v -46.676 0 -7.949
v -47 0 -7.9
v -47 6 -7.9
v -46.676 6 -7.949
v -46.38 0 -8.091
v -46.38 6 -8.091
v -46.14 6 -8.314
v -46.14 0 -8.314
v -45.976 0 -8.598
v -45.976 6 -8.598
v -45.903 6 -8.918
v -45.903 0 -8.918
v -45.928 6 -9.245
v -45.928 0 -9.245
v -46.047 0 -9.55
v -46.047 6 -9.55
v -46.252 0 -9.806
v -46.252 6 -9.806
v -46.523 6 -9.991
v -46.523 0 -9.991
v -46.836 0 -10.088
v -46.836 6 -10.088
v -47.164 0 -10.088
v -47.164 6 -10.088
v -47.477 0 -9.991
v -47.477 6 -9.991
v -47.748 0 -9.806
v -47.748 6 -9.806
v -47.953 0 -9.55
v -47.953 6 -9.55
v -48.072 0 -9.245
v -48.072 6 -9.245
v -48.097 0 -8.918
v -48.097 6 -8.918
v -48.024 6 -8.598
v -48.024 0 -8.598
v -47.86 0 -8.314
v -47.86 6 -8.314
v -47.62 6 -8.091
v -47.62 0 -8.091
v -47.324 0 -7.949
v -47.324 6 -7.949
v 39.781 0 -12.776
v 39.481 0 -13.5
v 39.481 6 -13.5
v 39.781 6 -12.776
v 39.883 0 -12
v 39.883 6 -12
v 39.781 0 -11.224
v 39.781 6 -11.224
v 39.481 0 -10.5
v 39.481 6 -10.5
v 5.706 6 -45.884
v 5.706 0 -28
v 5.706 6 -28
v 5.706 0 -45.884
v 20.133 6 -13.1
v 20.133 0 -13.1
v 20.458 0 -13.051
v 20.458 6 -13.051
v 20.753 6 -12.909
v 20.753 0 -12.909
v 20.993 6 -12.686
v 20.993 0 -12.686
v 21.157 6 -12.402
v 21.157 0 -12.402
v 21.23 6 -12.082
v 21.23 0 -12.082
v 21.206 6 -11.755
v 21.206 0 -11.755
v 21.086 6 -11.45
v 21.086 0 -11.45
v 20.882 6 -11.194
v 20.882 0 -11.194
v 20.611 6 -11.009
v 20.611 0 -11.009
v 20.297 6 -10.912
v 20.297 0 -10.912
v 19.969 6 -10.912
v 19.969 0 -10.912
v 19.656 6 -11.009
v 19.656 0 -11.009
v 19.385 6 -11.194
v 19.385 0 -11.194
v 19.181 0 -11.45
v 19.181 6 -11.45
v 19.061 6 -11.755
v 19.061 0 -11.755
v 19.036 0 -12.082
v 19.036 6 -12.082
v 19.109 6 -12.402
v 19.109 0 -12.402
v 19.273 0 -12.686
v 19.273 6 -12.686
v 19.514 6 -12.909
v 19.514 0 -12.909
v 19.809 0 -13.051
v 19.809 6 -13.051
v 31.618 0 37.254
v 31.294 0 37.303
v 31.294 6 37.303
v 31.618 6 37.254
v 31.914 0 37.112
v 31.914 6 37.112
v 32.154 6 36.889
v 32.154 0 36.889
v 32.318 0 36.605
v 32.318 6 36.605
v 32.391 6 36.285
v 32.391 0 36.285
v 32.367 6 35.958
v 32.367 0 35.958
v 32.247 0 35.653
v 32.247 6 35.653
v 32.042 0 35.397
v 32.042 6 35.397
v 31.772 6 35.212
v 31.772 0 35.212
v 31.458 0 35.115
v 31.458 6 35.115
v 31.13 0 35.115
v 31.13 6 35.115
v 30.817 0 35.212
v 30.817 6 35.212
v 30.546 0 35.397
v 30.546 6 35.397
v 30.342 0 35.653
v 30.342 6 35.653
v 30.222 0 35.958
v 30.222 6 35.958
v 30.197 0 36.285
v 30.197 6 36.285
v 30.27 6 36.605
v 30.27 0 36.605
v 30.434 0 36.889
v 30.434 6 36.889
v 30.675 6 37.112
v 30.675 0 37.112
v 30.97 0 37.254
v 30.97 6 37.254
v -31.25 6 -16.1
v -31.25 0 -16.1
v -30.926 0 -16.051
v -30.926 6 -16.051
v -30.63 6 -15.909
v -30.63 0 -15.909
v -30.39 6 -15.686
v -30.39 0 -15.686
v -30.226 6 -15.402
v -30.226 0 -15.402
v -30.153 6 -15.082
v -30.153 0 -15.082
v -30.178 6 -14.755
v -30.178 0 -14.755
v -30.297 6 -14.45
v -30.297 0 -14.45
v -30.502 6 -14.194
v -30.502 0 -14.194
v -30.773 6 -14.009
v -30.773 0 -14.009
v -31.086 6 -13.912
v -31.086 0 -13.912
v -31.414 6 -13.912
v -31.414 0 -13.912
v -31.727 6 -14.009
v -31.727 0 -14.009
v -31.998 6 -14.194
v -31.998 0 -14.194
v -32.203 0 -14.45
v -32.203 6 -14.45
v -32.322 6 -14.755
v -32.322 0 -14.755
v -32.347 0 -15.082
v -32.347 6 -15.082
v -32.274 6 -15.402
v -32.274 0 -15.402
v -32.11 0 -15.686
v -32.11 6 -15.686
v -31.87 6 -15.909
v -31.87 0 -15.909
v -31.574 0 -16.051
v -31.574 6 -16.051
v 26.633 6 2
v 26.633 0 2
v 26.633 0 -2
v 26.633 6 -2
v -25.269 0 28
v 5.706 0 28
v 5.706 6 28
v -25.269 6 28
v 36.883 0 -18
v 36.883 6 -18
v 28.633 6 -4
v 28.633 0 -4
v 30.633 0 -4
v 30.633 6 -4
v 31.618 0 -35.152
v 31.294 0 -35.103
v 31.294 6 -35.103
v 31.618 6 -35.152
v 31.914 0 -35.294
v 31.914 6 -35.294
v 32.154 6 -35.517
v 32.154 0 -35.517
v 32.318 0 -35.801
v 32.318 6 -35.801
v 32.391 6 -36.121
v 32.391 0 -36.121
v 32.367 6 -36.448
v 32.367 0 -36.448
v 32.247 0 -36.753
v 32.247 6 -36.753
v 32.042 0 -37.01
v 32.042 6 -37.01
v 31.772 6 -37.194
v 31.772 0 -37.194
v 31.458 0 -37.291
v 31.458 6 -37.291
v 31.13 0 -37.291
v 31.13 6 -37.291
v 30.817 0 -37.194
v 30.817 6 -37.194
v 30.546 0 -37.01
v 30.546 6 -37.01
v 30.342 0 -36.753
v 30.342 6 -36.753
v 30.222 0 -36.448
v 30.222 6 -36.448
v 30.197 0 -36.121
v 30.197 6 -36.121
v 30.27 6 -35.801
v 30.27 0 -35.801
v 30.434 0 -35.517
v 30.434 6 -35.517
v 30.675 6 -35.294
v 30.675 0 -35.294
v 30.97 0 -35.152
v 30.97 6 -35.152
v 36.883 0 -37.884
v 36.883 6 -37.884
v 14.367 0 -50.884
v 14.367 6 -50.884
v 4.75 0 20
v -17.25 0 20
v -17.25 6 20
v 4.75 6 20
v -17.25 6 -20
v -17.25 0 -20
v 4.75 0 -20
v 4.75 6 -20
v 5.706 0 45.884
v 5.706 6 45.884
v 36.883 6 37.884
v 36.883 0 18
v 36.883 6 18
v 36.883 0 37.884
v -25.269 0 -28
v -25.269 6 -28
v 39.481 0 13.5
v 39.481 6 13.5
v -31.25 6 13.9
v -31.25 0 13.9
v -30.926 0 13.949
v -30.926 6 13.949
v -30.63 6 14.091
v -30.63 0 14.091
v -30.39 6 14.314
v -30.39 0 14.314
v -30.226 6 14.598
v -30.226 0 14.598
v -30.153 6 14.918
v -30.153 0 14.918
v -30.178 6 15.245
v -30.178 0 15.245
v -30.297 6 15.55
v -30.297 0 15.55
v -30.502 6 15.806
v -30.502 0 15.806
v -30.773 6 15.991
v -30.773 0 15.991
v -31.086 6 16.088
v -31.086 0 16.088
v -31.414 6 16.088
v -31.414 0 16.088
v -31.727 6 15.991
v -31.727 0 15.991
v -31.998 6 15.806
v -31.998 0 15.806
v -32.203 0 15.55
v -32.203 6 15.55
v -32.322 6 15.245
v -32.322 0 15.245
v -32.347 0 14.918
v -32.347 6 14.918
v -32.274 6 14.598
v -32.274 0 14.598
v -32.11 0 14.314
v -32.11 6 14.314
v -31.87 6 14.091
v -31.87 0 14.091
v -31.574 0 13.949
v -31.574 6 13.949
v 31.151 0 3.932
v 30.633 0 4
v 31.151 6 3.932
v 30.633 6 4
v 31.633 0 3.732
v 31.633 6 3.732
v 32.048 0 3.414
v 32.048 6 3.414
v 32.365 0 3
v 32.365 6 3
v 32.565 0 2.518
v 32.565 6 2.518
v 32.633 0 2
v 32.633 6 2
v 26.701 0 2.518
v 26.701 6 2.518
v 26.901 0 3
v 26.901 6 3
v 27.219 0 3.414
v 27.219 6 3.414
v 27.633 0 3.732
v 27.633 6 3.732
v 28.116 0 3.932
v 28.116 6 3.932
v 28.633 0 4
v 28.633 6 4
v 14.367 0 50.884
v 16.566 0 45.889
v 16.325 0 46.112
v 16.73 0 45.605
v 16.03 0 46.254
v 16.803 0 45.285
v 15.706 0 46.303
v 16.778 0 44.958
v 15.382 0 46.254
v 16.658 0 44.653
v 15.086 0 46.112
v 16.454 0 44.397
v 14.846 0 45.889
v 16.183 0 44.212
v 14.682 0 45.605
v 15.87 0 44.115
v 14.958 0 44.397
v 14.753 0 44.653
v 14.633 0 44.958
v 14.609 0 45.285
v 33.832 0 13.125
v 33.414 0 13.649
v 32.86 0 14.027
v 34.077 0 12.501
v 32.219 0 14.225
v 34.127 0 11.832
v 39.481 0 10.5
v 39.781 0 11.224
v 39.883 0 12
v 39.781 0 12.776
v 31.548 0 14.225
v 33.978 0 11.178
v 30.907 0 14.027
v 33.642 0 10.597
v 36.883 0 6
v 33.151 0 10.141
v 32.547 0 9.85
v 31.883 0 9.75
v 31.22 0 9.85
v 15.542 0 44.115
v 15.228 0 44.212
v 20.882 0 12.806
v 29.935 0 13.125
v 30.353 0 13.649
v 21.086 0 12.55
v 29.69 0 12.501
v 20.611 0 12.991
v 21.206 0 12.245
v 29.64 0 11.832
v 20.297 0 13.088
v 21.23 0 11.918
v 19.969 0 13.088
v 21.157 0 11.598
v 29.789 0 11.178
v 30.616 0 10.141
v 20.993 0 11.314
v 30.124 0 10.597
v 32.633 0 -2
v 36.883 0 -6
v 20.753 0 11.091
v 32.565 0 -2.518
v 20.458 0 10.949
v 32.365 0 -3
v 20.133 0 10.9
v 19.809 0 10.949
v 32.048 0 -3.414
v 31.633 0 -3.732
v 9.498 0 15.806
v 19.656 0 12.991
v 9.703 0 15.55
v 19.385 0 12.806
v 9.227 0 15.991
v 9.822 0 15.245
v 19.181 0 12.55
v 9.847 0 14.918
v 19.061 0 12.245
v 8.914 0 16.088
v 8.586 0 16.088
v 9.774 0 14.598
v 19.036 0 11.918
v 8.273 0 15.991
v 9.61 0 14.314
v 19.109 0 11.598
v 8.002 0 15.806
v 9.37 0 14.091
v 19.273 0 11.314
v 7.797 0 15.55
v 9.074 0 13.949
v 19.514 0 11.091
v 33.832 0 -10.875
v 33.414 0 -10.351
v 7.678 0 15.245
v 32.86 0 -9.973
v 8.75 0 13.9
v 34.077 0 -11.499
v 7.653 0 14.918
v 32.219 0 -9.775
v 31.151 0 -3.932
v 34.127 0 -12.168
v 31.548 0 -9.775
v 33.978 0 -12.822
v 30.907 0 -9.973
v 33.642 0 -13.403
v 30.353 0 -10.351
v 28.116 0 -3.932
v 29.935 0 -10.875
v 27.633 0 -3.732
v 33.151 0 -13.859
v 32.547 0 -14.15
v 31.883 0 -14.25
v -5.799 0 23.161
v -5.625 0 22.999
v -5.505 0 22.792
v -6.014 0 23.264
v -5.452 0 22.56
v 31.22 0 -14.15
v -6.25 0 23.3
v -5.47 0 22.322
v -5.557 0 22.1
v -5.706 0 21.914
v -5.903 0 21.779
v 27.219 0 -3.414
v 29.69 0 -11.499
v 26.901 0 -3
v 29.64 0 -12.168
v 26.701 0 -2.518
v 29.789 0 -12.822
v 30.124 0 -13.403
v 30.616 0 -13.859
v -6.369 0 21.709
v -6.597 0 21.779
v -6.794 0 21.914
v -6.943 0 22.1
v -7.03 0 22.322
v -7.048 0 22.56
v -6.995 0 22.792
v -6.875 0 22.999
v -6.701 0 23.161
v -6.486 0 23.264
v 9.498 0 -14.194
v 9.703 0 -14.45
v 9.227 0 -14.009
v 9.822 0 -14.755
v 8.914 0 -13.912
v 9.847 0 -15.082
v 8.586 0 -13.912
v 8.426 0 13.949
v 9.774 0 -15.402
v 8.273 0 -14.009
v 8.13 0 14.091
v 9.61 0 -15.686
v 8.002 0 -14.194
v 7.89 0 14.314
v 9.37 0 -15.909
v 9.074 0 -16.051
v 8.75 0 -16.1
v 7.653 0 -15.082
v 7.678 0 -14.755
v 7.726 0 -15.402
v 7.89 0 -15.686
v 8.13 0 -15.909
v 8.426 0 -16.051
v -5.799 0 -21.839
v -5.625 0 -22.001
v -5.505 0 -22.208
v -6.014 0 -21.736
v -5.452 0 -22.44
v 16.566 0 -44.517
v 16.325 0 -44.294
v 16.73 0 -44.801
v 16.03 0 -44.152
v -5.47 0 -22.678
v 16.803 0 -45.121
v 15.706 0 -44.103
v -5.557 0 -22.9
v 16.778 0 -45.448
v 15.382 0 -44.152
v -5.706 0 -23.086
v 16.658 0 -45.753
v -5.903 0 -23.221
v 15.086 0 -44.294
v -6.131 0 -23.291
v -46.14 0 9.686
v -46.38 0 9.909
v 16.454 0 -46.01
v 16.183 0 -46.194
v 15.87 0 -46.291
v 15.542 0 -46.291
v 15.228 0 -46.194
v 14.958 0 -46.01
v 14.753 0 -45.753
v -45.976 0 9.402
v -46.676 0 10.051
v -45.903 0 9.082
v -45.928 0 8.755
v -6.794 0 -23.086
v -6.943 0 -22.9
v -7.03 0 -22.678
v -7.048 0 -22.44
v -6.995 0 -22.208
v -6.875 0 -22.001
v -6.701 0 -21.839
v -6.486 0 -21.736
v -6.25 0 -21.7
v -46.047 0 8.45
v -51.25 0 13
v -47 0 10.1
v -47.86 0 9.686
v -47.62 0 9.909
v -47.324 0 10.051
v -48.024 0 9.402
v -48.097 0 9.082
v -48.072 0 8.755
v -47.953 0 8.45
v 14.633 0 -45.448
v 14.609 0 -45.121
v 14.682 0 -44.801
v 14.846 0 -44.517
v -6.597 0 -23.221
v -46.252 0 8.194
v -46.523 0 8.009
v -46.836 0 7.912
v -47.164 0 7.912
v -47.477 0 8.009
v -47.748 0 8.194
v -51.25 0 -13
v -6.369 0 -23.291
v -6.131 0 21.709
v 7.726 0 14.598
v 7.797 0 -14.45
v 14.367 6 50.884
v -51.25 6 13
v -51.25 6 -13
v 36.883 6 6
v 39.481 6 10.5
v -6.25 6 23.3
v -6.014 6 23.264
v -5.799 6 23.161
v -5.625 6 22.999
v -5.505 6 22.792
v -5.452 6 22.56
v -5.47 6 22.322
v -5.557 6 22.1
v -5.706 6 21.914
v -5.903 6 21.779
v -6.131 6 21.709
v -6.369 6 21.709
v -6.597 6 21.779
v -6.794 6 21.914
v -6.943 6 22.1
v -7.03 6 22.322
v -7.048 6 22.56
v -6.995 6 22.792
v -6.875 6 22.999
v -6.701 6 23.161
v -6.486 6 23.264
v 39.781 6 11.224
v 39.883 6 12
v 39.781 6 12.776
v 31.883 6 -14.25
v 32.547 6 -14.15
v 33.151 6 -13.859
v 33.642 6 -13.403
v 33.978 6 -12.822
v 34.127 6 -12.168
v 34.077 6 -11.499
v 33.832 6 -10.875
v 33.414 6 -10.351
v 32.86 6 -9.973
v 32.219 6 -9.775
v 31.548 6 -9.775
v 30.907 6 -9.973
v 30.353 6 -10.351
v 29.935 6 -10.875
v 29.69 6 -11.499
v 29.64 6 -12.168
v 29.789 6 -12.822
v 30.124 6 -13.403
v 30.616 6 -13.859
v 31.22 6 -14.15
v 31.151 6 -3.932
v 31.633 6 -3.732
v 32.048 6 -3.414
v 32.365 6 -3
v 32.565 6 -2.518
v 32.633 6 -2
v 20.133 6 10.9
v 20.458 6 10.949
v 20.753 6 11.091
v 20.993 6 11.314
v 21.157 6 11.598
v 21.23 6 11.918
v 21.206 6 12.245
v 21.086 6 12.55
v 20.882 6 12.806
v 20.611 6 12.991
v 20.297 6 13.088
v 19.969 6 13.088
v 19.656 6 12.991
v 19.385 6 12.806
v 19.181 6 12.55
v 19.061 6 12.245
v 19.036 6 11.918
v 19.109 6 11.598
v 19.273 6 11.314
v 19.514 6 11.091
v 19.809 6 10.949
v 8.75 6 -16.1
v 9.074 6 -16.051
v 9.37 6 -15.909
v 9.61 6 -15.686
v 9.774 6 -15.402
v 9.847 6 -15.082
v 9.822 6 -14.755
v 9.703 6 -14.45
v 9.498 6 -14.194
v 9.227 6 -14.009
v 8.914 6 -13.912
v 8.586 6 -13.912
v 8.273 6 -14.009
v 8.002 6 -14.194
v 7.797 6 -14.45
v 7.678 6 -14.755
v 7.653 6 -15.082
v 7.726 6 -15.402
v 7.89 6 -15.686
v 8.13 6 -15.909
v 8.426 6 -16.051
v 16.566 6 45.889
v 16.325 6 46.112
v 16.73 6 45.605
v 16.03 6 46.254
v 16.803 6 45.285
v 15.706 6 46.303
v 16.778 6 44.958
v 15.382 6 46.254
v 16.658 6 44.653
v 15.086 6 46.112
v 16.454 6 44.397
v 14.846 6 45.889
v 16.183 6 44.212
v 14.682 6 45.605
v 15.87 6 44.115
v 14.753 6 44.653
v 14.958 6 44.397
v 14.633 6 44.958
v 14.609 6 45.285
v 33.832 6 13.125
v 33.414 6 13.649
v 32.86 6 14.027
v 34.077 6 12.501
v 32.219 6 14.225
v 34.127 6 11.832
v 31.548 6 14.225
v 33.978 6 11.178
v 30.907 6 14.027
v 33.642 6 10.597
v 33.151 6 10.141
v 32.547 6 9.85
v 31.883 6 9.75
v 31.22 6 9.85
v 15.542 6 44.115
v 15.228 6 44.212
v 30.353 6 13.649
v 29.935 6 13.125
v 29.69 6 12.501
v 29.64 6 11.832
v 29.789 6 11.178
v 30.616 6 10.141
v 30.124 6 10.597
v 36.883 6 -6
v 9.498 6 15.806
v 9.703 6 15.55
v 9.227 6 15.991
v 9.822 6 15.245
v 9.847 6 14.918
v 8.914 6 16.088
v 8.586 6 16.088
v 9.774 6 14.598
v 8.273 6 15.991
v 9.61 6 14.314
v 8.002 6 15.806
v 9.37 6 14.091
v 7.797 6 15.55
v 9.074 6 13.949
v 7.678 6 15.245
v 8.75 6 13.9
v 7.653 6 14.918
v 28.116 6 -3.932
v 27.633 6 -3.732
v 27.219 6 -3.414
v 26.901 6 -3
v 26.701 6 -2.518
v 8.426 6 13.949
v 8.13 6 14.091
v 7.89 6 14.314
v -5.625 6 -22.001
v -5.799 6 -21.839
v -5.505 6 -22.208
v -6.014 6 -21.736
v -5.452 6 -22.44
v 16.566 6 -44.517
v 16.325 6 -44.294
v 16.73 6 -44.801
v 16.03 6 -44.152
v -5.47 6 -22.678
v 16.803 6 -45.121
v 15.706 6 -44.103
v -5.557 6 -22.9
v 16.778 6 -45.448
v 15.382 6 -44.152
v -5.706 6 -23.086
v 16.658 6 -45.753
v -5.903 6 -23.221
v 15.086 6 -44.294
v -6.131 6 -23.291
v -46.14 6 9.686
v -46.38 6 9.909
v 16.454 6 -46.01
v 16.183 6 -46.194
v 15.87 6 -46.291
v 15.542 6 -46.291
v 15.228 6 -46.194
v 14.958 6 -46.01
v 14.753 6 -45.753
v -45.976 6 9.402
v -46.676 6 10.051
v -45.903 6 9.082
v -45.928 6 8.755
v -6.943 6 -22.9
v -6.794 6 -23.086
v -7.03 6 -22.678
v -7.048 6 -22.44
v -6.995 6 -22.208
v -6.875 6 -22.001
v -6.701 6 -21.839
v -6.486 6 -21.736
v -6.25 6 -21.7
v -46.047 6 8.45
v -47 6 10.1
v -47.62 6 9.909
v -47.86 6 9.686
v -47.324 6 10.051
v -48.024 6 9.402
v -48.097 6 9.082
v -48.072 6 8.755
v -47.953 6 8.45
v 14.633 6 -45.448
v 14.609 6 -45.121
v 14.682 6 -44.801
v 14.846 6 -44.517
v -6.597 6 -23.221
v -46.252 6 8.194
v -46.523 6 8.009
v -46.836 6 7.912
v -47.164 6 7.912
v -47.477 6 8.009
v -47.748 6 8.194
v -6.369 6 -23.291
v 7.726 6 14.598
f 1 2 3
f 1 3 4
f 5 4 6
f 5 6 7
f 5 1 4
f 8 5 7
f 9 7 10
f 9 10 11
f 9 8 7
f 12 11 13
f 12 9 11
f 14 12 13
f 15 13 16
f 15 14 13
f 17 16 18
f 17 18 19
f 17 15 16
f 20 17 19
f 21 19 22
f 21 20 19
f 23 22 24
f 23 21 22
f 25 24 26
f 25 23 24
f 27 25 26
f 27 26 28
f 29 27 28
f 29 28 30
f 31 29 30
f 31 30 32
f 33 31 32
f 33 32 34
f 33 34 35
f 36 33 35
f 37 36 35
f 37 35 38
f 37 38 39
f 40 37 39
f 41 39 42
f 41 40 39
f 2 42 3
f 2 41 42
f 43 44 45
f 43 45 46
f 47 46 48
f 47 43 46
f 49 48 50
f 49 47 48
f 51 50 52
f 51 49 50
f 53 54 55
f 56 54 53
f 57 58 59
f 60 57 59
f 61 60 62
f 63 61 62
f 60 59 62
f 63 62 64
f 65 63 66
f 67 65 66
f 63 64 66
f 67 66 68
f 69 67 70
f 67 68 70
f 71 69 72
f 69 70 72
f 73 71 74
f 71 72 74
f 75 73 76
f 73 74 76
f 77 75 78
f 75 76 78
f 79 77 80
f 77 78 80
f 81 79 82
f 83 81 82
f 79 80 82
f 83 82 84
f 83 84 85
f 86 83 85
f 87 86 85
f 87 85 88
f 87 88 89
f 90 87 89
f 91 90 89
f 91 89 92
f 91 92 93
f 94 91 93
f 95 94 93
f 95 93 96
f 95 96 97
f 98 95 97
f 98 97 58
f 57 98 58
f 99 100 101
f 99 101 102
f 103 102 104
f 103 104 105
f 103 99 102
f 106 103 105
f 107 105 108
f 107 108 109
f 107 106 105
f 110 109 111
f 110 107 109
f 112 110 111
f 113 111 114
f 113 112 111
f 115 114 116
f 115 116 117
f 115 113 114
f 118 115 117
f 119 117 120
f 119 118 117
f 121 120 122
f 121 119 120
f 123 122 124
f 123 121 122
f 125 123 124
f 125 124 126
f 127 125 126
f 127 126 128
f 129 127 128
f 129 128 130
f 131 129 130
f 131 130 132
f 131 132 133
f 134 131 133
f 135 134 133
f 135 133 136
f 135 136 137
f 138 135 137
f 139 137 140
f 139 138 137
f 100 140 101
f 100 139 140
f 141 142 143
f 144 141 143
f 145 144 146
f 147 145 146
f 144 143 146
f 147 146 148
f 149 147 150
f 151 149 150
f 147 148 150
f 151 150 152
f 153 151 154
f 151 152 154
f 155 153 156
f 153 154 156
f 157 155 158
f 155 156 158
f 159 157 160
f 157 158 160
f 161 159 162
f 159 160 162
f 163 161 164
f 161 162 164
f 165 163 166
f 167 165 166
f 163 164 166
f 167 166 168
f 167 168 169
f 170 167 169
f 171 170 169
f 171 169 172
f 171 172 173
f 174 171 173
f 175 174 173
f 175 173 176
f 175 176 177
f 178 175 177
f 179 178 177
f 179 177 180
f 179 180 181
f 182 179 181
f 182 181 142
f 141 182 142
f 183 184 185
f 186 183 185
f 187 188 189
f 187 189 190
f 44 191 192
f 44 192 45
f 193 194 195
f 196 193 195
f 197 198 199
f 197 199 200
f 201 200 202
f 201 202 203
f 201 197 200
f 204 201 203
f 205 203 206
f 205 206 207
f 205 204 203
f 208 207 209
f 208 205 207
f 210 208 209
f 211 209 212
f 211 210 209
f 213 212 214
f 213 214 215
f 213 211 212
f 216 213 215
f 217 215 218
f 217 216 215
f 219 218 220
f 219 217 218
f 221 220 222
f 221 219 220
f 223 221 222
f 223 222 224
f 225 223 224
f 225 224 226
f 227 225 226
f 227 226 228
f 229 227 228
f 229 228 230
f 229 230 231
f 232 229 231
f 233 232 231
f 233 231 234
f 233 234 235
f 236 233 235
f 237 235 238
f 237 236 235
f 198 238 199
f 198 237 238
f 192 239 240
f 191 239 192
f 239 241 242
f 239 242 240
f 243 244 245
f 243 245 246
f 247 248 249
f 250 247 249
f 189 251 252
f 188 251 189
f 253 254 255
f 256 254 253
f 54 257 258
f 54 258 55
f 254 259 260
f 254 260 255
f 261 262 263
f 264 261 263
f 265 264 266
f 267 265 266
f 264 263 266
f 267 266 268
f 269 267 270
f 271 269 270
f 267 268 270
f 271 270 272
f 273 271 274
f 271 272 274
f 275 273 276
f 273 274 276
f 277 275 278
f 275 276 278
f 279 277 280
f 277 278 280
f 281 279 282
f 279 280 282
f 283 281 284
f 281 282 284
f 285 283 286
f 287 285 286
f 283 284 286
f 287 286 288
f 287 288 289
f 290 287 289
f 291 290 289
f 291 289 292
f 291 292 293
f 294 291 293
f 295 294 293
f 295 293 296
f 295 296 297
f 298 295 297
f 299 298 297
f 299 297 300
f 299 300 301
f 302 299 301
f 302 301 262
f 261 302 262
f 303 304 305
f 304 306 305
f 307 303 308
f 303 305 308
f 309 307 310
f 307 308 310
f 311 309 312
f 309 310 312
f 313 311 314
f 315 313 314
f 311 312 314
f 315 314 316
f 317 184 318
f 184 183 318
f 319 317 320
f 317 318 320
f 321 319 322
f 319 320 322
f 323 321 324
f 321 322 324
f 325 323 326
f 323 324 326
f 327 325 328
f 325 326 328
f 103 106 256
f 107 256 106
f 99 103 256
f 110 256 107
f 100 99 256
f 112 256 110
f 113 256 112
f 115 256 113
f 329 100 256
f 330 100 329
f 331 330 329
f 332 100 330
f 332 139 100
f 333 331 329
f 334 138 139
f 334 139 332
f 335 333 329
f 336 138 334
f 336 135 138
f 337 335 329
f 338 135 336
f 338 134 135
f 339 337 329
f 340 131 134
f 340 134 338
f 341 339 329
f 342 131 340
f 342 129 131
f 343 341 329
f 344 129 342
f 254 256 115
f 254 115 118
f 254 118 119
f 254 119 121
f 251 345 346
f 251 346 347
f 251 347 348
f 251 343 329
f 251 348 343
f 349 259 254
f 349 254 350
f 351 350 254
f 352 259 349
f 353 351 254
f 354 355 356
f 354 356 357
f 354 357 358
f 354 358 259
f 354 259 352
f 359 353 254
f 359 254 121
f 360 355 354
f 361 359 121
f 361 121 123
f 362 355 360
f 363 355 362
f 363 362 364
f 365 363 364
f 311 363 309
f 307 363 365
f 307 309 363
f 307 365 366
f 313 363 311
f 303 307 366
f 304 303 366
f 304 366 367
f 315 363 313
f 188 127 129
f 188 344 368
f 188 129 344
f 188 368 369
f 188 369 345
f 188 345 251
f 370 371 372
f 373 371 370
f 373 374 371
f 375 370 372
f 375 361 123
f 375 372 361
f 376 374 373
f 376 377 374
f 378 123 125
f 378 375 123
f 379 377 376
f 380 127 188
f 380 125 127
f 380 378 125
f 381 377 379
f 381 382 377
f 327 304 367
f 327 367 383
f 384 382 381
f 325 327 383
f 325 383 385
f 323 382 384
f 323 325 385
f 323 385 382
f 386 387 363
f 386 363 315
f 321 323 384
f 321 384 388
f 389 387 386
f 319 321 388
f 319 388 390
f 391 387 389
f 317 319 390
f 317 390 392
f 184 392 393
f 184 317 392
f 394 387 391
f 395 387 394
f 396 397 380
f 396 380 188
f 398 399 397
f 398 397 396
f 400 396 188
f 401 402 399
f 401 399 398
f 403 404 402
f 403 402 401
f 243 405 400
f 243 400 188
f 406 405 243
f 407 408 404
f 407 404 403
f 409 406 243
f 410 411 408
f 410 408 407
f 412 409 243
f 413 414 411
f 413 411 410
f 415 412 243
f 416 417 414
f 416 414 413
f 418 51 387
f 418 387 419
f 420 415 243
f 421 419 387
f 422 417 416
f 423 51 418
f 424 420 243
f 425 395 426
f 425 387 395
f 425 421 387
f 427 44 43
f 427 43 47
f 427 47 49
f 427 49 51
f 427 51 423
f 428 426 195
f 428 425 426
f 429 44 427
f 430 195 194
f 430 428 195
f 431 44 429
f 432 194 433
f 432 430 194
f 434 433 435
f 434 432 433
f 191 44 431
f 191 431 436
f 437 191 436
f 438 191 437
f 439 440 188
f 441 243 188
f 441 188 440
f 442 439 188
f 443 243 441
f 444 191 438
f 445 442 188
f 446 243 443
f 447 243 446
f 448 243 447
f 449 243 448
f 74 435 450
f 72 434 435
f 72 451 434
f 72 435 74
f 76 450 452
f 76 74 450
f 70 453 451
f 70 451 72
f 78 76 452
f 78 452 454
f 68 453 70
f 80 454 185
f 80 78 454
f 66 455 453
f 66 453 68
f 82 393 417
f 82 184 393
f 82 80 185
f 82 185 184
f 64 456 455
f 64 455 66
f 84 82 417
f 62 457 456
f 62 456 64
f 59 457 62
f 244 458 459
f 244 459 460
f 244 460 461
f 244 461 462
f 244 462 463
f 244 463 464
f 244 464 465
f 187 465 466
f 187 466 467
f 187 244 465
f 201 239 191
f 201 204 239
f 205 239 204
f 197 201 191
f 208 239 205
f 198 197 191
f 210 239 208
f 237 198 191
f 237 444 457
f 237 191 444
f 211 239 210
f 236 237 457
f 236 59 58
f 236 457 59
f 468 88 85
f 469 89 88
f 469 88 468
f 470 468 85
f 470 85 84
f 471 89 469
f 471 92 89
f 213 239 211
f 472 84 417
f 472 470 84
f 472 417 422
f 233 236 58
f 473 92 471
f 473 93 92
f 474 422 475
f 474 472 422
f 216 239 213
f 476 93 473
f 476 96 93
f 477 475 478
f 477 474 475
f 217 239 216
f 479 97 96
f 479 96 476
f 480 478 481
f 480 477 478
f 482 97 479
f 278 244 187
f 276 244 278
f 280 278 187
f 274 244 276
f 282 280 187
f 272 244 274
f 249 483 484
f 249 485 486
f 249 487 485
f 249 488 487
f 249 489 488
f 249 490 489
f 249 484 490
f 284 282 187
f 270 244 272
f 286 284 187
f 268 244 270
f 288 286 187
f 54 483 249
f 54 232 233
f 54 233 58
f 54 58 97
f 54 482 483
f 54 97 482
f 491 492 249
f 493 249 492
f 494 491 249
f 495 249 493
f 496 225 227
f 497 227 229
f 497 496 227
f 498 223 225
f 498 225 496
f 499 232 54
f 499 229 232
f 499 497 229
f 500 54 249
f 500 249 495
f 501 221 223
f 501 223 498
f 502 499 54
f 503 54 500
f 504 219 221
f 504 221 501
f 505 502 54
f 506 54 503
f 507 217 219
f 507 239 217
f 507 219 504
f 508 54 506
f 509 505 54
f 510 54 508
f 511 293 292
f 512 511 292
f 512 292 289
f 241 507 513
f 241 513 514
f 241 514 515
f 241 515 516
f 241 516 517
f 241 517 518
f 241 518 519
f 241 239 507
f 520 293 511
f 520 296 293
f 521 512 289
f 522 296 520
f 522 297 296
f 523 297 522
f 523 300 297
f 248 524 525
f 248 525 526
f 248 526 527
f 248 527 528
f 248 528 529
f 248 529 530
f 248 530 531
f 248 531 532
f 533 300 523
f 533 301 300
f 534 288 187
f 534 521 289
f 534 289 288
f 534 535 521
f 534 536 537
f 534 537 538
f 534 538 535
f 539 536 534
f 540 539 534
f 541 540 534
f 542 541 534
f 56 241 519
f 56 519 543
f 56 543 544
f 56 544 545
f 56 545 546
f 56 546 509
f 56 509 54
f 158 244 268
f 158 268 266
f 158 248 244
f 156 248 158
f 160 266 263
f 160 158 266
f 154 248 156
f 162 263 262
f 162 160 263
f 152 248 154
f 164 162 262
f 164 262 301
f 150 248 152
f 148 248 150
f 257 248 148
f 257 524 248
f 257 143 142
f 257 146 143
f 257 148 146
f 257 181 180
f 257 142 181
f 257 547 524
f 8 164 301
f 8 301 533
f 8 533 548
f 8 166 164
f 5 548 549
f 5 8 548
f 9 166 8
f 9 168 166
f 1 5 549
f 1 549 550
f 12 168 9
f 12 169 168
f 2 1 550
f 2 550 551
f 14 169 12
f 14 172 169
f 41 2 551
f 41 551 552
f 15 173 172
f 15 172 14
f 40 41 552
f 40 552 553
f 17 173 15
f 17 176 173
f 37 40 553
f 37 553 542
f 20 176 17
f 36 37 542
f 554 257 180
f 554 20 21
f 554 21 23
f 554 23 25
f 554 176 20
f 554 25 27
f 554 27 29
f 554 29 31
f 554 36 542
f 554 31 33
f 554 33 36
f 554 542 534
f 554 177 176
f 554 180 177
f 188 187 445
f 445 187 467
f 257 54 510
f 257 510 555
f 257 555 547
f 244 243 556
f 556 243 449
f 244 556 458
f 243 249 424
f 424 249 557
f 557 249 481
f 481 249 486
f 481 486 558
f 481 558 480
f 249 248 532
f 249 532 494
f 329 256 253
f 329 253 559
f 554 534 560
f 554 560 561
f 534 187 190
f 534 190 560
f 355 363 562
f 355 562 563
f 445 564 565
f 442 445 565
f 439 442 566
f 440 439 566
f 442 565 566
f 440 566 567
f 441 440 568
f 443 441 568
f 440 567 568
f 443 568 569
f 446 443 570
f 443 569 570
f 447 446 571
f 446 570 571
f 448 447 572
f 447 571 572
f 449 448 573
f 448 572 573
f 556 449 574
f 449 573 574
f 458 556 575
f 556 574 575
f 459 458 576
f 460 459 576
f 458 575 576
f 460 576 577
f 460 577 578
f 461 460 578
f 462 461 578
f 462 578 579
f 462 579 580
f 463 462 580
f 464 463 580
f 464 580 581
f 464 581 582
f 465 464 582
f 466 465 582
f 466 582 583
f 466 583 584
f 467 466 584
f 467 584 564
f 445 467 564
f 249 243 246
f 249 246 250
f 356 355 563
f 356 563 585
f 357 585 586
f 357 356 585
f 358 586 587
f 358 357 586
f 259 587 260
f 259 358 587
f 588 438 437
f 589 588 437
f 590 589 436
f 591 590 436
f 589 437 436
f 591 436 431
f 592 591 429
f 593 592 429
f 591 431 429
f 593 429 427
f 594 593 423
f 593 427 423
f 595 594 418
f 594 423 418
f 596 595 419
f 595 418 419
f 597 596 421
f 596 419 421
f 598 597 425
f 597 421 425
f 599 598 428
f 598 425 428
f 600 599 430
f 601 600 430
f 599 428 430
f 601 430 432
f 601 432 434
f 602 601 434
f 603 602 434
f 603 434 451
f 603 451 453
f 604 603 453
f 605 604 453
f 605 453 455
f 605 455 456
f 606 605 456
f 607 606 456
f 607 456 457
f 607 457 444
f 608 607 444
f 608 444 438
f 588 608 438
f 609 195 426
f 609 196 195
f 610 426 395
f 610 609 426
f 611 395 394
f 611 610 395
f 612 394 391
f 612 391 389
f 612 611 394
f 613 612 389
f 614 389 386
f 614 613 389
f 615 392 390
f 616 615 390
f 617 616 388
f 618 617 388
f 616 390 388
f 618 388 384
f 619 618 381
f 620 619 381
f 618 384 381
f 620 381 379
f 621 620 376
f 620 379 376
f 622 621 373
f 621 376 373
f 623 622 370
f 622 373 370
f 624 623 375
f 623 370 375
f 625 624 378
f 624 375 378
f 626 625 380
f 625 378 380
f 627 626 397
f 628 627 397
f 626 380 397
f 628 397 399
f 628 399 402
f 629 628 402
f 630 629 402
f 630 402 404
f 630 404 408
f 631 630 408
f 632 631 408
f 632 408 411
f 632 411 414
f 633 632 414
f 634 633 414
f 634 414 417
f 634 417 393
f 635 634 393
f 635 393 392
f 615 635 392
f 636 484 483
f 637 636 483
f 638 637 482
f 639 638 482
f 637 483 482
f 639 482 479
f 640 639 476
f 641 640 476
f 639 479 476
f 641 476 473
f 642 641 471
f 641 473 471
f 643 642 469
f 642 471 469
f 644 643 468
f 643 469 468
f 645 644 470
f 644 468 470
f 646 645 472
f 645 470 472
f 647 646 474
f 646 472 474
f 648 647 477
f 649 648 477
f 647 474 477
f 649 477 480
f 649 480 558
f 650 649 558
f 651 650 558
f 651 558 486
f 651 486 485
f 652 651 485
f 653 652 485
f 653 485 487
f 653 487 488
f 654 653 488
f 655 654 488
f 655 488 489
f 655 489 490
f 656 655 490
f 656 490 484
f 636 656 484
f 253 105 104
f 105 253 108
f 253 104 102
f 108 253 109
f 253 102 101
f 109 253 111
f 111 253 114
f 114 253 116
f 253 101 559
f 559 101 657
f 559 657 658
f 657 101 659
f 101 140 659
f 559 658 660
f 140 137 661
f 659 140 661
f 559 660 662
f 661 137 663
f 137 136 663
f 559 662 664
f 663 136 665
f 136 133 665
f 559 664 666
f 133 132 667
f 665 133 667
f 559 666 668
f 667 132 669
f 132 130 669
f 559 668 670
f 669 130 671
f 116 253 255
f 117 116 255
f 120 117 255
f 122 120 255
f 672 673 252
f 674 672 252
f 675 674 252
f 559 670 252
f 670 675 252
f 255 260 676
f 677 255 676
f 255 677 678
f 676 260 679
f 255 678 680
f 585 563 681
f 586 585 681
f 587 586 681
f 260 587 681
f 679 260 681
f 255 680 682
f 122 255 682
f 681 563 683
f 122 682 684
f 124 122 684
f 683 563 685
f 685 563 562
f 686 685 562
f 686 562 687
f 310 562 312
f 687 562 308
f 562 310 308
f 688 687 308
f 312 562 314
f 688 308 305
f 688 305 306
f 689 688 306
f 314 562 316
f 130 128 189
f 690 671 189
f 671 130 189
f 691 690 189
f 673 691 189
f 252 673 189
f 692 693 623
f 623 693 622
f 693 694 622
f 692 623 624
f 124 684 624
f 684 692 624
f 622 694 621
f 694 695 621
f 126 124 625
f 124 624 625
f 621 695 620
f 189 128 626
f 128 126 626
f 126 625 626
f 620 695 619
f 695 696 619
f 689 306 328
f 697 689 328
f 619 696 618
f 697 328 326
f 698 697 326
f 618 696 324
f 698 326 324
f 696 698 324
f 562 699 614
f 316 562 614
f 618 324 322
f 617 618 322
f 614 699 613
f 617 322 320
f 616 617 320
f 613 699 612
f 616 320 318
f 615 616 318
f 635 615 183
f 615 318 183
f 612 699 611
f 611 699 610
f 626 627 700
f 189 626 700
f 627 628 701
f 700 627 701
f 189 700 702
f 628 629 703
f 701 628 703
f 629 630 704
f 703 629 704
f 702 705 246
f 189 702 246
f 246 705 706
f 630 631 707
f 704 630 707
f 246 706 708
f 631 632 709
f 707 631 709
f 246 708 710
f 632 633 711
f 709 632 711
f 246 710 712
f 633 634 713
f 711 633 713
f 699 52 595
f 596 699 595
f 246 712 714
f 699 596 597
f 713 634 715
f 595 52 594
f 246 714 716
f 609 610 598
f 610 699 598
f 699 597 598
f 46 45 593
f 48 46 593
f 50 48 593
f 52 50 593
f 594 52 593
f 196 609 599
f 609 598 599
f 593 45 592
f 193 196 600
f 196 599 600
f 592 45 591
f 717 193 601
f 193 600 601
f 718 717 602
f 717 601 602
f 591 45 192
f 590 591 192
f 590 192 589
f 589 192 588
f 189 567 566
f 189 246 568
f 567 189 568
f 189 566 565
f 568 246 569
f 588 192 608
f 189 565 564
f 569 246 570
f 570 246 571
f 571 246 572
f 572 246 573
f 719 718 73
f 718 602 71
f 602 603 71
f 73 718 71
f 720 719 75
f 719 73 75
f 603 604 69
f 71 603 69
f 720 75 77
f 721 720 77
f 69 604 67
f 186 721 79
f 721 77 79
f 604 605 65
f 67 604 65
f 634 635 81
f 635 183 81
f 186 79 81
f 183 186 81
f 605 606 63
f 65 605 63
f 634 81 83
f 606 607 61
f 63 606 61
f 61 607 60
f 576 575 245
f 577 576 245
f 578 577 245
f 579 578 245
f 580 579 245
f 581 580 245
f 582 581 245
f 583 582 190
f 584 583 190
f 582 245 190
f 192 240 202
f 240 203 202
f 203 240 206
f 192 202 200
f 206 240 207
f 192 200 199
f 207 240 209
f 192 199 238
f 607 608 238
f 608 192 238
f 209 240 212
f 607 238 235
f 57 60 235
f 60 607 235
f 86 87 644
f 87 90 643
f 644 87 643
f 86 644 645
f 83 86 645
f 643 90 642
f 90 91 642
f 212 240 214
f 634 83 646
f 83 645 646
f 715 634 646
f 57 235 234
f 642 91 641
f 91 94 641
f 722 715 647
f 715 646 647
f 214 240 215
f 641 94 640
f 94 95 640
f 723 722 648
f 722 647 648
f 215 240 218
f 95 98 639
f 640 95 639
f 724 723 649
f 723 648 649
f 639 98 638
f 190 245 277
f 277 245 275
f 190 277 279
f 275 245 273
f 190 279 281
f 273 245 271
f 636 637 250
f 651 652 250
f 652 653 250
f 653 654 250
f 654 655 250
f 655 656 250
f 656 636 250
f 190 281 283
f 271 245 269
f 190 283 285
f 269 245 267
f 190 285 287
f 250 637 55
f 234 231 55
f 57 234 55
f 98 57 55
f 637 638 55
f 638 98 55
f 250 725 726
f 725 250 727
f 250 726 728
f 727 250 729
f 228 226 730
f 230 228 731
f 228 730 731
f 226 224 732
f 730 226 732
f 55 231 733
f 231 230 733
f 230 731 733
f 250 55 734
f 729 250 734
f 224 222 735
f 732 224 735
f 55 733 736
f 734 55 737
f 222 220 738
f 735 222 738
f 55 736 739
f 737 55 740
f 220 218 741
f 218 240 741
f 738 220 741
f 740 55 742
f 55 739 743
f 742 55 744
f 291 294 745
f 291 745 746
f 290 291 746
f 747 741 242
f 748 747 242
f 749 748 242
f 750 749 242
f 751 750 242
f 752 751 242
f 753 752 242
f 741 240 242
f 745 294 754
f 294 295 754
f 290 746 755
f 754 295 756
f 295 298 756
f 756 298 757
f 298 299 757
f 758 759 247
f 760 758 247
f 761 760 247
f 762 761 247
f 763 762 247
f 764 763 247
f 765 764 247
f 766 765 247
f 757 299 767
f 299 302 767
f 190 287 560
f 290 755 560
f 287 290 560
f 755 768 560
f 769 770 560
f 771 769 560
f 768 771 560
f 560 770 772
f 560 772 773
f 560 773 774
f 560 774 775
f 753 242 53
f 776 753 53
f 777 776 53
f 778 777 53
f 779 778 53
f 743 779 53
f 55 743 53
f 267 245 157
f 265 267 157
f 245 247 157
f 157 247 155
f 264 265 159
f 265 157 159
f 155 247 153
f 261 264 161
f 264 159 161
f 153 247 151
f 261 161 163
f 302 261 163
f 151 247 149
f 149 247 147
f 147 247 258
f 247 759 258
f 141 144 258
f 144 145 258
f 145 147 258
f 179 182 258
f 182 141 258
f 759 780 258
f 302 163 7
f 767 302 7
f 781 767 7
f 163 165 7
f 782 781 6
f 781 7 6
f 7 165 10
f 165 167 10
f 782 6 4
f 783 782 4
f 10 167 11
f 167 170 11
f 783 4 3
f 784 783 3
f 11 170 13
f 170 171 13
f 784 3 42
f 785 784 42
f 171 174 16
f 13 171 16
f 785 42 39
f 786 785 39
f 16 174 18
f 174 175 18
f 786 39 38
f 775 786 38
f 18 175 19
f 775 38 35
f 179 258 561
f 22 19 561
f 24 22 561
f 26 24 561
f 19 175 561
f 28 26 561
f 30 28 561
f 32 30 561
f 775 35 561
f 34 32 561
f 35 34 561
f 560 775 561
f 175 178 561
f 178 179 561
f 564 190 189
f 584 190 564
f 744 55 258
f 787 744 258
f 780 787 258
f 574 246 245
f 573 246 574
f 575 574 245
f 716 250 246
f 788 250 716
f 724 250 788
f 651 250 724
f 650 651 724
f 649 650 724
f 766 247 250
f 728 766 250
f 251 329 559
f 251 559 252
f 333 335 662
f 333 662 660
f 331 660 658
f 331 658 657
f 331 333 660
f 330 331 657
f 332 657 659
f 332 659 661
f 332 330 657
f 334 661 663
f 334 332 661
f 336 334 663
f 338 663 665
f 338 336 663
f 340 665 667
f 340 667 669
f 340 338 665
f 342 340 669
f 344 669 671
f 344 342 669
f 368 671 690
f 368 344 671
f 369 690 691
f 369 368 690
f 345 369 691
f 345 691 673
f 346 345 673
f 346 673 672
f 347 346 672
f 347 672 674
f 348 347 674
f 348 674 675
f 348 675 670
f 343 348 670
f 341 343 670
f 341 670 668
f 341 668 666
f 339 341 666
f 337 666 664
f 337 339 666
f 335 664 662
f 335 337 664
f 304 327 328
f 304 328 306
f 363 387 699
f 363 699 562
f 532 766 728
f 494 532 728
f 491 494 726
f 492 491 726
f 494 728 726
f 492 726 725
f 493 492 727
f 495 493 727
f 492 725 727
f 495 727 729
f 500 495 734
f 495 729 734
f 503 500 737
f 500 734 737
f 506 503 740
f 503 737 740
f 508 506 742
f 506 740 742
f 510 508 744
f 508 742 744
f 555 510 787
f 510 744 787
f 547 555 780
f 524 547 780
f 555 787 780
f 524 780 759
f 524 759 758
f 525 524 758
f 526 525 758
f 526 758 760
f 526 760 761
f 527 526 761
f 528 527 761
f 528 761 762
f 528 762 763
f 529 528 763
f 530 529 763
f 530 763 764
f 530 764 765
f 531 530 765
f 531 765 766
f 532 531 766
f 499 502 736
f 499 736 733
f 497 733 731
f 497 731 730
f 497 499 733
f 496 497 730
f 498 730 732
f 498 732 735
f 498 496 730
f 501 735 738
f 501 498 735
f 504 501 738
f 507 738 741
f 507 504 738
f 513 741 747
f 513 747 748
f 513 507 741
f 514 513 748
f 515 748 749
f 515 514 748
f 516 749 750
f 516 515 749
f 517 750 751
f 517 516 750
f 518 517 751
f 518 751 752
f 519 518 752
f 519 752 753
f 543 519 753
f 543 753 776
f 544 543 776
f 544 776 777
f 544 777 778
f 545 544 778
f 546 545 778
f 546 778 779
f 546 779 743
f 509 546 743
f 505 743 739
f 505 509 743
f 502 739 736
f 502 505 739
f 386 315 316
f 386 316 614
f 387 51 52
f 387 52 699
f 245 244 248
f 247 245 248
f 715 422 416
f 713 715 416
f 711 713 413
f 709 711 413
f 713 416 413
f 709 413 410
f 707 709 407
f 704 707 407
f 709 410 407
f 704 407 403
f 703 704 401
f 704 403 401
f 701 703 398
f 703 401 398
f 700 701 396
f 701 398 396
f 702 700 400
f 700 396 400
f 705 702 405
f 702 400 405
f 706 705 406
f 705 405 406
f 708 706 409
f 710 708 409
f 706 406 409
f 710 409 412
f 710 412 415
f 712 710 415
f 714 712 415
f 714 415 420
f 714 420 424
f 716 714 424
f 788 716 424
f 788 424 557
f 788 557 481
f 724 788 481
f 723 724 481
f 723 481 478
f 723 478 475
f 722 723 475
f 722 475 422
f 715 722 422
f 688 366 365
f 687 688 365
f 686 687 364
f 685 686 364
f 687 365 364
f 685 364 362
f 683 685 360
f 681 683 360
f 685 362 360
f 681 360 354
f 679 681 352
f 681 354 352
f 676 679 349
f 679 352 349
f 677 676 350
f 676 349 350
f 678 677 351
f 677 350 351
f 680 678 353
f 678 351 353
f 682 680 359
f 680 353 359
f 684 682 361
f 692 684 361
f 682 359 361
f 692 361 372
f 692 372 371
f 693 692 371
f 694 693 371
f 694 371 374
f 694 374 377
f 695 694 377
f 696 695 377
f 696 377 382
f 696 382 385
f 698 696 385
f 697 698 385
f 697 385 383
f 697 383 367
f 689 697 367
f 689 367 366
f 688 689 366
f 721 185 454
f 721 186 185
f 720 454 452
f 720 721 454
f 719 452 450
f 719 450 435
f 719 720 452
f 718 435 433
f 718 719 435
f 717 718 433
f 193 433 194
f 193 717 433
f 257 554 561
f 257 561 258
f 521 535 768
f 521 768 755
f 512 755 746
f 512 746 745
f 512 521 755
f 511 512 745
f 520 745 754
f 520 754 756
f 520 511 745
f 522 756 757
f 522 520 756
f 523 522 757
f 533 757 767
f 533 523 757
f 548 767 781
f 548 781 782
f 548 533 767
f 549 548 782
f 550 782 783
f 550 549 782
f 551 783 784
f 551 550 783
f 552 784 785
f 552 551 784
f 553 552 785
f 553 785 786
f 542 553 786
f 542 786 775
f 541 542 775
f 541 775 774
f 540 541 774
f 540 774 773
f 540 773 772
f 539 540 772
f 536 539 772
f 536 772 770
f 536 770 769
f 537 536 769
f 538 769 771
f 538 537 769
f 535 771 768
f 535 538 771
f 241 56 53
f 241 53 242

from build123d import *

# Parameters (mm, degrees)
SKETCH1_R                  = 1.1
SKETCH1_W                  = 22
SKETCH1_H                  = 40
SKETCH1_W_2                = 6
SKETCH1_H_2                = 8
BOSS_EXTRUDE1_DEPTH        = 6
F_1_6_1_6_DIAMETER_HOLE3_D = 1.6
BOSS_EXTRUDE2_DEPTH        = 6
FILLET1_R                  = 2
F_2_2_2_2_DIAMETER_HOLE1_D = 2.2
F_4_0MM_DOWEL_HOLE1_D      = 4.5
F_2_0MM_DOWEL_HOLE1_D      = 2.2


with BuildPart() as part:
    # Sketch1 → Boss-Extrude1 (new body)
    with BuildSketch(Plane(origin=(0, 0, 0), x_dir=(1, 0, 0), z_dir=(0, 1, 0))):
        Polygon((14.366669751, 50.883801944), (36.883330249, 37.883801944), (36.883330249, -37.883801944), (14.366669751, -50.883801944), (5.706415713, -45.883801944), (5.706415713, -28), (-25.269237886, -28), (-51.25, -13), (-51.25, 13), (-25.269237886, 28), (5.706415713, 28), (5.706415713, 45.883801944), align=None)
        with Locations(Location((15.705771366, 45.203193978, 0), (0, 0, 270))):
            Circle(SKETCH1_R, mode=Mode.SUBTRACT)
        with Locations(Location((31.294228634, 36.203193978, 0), (0, 0, 270))):
            Circle(SKETCH1_R, mode=Mode.SUBTRACT)
        with Locations(Location((31.294228634, -36.203193978, 0), (0, 0, 270))):
            Circle(SKETCH1_R, mode=Mode.SUBTRACT)
        with Locations(Location((15.705771366, -45.203193978, 0), (0, 0, 270))):
            Circle(SKETCH1_R, mode=Mode.SUBTRACT)
        with Locations(Location((-47, 9, 0), (0, 0, 270))):
            Circle(SKETCH1_R, mode=Mode.SUBTRACT)
        with Locations(Location((-47, -9, 0), (0, 0, 270))):
            Circle(SKETCH1_R, mode=Mode.SUBTRACT)
        with Locations((-6.25, 0)):
            Rectangle(SKETCH1_W, SKETCH1_H, mode=Mode.SUBTRACT)
        with Locations((29.633330249, 0)):
            Rectangle(SKETCH1_W_2, SKETCH1_H_2, mode=Mode.SUBTRACT)
    extrude(amount=BOSS_EXTRUDE1_DEPTH)

    # Ø1.6 (1.6) Diameter Hole3 (through all)
    with Locations(Plane(origin=(-6.25, 0, 22.5), x_dir=(0, 0, -1), z_dir=(0, -1, 0))):
        with Locations((0, 0), (45, 0)):
            Hole(F_1_6_1_6_DIAMETER_HOLE3_D / 2)

    # Sketch9 → Boss-Extrude2 (add)
    with BuildSketch(Plane.XZ):
        with BuildLine():
            Line((36.883330249, -9), (36.883330249, -15))
            ThreePointArc((36.883330249, -15), (38.383330249, -14.598076211), (39.481406461, -13.5))
            ThreePointArc((39.481406461, -13.5), (39.883330249, -12), (39.481406461, -10.5))
            ThreePointArc((39.481406461, -10.5), (38.383330249, -9.401923789), (36.883330249, -9))
        make_face()
        with BuildLine():
            Line((36.883330249, -6), (36.883330249, -9))
            ThreePointArc((36.883330249, -9), (38.383330249, -9.401923789), (39.481406461, -10.5))
            Line((39.481406461, -10.5), (36.883330249, -6))
        make_face()
        with BuildLine():
            Line((36.883330249, -15), (36.883330249, -18))
            Line((36.883330249, -18), (39.481406461, -13.5))
            ThreePointArc((39.481406461, -13.5), (38.383330249, -14.598076211), (36.883330249, -15))
        make_face()
        with BuildLine():
            ThreePointArc((39.481406461, 10.5), (39.883330249, 12), (39.481406461, 13.5))
            ThreePointArc((39.481406461, 13.5), (38.383330249, 14.598076211), (36.883330249, 15))
            Line((36.883330249, 15), (36.883330249, 9))
            ThreePointArc((36.883330249, 9), (38.383330249, 9.401923789), (39.481406461, 10.5))
        make_face()
        with BuildLine():
            Line((36.883330249, 6), (39.481406461, 10.5))
            ThreePointArc((39.481406461, 10.5), (38.383330249, 9.401923789), (36.883330249, 9))
            Line((36.883330249, 9), (36.883330249, 6))
        make_face()
        with BuildLine():
            ThreePointArc((36.883330249, 15), (38.383330249, 14.598076211), (39.481406461, 13.5))
            Line((39.481406461, 13.5), (36.883330249, 18))
            Line((36.883330249, 18), (36.883330249, 15))
        make_face()
    extrude(amount=-BOSS_EXTRUDE2_DEPTH)

    # Fillet1
    fillet1_edges = [part.edges().sort_by_distance(p)[0] for p in [
        (32.633330249, 3, 4),
        (32.633330249, 3, -4),
        (26.633330249, 3, -4),
        (26.633330249, 3, 4),
    ]]
    fillet(fillet1_edges, radius=FILLET1_R)

    # Ø2.2 (2.2) Diameter Hole1 (through all)
    with Locations(Plane(origin=(20.133330249, 6, -12), x_dir=(0, 0, 1), z_dir=(0, 1, 0))):
        with Locations((0, 0), (24, 0)):
            Hole(F_2_2_2_2_DIAMETER_HOLE1_D / 2)

    # Ø4.0mm Dowel Hole1 (through all)
    with Locations(Plane(origin=(31.883330249, 6, -12), x_dir=(0, 0, 1), z_dir=(0, 1, 0))):
        with Locations((0, 0), (24, 0)):
            Hole(F_4_0MM_DOWEL_HOLE1_D / 2)

    # Ø2.0mm Dowel Hole1 (through all)
    with Locations(Plane(origin=(-31.25, 6, -15), x_dir=(0, 0, 1), z_dir=(0, 1, 0))):
        with Locations((0, 0), (30, 0), (30, 40), (0, 40)):
            Hole(F_2_0MM_DOWEL_HOLE1_D / 2)


solid = part.part
